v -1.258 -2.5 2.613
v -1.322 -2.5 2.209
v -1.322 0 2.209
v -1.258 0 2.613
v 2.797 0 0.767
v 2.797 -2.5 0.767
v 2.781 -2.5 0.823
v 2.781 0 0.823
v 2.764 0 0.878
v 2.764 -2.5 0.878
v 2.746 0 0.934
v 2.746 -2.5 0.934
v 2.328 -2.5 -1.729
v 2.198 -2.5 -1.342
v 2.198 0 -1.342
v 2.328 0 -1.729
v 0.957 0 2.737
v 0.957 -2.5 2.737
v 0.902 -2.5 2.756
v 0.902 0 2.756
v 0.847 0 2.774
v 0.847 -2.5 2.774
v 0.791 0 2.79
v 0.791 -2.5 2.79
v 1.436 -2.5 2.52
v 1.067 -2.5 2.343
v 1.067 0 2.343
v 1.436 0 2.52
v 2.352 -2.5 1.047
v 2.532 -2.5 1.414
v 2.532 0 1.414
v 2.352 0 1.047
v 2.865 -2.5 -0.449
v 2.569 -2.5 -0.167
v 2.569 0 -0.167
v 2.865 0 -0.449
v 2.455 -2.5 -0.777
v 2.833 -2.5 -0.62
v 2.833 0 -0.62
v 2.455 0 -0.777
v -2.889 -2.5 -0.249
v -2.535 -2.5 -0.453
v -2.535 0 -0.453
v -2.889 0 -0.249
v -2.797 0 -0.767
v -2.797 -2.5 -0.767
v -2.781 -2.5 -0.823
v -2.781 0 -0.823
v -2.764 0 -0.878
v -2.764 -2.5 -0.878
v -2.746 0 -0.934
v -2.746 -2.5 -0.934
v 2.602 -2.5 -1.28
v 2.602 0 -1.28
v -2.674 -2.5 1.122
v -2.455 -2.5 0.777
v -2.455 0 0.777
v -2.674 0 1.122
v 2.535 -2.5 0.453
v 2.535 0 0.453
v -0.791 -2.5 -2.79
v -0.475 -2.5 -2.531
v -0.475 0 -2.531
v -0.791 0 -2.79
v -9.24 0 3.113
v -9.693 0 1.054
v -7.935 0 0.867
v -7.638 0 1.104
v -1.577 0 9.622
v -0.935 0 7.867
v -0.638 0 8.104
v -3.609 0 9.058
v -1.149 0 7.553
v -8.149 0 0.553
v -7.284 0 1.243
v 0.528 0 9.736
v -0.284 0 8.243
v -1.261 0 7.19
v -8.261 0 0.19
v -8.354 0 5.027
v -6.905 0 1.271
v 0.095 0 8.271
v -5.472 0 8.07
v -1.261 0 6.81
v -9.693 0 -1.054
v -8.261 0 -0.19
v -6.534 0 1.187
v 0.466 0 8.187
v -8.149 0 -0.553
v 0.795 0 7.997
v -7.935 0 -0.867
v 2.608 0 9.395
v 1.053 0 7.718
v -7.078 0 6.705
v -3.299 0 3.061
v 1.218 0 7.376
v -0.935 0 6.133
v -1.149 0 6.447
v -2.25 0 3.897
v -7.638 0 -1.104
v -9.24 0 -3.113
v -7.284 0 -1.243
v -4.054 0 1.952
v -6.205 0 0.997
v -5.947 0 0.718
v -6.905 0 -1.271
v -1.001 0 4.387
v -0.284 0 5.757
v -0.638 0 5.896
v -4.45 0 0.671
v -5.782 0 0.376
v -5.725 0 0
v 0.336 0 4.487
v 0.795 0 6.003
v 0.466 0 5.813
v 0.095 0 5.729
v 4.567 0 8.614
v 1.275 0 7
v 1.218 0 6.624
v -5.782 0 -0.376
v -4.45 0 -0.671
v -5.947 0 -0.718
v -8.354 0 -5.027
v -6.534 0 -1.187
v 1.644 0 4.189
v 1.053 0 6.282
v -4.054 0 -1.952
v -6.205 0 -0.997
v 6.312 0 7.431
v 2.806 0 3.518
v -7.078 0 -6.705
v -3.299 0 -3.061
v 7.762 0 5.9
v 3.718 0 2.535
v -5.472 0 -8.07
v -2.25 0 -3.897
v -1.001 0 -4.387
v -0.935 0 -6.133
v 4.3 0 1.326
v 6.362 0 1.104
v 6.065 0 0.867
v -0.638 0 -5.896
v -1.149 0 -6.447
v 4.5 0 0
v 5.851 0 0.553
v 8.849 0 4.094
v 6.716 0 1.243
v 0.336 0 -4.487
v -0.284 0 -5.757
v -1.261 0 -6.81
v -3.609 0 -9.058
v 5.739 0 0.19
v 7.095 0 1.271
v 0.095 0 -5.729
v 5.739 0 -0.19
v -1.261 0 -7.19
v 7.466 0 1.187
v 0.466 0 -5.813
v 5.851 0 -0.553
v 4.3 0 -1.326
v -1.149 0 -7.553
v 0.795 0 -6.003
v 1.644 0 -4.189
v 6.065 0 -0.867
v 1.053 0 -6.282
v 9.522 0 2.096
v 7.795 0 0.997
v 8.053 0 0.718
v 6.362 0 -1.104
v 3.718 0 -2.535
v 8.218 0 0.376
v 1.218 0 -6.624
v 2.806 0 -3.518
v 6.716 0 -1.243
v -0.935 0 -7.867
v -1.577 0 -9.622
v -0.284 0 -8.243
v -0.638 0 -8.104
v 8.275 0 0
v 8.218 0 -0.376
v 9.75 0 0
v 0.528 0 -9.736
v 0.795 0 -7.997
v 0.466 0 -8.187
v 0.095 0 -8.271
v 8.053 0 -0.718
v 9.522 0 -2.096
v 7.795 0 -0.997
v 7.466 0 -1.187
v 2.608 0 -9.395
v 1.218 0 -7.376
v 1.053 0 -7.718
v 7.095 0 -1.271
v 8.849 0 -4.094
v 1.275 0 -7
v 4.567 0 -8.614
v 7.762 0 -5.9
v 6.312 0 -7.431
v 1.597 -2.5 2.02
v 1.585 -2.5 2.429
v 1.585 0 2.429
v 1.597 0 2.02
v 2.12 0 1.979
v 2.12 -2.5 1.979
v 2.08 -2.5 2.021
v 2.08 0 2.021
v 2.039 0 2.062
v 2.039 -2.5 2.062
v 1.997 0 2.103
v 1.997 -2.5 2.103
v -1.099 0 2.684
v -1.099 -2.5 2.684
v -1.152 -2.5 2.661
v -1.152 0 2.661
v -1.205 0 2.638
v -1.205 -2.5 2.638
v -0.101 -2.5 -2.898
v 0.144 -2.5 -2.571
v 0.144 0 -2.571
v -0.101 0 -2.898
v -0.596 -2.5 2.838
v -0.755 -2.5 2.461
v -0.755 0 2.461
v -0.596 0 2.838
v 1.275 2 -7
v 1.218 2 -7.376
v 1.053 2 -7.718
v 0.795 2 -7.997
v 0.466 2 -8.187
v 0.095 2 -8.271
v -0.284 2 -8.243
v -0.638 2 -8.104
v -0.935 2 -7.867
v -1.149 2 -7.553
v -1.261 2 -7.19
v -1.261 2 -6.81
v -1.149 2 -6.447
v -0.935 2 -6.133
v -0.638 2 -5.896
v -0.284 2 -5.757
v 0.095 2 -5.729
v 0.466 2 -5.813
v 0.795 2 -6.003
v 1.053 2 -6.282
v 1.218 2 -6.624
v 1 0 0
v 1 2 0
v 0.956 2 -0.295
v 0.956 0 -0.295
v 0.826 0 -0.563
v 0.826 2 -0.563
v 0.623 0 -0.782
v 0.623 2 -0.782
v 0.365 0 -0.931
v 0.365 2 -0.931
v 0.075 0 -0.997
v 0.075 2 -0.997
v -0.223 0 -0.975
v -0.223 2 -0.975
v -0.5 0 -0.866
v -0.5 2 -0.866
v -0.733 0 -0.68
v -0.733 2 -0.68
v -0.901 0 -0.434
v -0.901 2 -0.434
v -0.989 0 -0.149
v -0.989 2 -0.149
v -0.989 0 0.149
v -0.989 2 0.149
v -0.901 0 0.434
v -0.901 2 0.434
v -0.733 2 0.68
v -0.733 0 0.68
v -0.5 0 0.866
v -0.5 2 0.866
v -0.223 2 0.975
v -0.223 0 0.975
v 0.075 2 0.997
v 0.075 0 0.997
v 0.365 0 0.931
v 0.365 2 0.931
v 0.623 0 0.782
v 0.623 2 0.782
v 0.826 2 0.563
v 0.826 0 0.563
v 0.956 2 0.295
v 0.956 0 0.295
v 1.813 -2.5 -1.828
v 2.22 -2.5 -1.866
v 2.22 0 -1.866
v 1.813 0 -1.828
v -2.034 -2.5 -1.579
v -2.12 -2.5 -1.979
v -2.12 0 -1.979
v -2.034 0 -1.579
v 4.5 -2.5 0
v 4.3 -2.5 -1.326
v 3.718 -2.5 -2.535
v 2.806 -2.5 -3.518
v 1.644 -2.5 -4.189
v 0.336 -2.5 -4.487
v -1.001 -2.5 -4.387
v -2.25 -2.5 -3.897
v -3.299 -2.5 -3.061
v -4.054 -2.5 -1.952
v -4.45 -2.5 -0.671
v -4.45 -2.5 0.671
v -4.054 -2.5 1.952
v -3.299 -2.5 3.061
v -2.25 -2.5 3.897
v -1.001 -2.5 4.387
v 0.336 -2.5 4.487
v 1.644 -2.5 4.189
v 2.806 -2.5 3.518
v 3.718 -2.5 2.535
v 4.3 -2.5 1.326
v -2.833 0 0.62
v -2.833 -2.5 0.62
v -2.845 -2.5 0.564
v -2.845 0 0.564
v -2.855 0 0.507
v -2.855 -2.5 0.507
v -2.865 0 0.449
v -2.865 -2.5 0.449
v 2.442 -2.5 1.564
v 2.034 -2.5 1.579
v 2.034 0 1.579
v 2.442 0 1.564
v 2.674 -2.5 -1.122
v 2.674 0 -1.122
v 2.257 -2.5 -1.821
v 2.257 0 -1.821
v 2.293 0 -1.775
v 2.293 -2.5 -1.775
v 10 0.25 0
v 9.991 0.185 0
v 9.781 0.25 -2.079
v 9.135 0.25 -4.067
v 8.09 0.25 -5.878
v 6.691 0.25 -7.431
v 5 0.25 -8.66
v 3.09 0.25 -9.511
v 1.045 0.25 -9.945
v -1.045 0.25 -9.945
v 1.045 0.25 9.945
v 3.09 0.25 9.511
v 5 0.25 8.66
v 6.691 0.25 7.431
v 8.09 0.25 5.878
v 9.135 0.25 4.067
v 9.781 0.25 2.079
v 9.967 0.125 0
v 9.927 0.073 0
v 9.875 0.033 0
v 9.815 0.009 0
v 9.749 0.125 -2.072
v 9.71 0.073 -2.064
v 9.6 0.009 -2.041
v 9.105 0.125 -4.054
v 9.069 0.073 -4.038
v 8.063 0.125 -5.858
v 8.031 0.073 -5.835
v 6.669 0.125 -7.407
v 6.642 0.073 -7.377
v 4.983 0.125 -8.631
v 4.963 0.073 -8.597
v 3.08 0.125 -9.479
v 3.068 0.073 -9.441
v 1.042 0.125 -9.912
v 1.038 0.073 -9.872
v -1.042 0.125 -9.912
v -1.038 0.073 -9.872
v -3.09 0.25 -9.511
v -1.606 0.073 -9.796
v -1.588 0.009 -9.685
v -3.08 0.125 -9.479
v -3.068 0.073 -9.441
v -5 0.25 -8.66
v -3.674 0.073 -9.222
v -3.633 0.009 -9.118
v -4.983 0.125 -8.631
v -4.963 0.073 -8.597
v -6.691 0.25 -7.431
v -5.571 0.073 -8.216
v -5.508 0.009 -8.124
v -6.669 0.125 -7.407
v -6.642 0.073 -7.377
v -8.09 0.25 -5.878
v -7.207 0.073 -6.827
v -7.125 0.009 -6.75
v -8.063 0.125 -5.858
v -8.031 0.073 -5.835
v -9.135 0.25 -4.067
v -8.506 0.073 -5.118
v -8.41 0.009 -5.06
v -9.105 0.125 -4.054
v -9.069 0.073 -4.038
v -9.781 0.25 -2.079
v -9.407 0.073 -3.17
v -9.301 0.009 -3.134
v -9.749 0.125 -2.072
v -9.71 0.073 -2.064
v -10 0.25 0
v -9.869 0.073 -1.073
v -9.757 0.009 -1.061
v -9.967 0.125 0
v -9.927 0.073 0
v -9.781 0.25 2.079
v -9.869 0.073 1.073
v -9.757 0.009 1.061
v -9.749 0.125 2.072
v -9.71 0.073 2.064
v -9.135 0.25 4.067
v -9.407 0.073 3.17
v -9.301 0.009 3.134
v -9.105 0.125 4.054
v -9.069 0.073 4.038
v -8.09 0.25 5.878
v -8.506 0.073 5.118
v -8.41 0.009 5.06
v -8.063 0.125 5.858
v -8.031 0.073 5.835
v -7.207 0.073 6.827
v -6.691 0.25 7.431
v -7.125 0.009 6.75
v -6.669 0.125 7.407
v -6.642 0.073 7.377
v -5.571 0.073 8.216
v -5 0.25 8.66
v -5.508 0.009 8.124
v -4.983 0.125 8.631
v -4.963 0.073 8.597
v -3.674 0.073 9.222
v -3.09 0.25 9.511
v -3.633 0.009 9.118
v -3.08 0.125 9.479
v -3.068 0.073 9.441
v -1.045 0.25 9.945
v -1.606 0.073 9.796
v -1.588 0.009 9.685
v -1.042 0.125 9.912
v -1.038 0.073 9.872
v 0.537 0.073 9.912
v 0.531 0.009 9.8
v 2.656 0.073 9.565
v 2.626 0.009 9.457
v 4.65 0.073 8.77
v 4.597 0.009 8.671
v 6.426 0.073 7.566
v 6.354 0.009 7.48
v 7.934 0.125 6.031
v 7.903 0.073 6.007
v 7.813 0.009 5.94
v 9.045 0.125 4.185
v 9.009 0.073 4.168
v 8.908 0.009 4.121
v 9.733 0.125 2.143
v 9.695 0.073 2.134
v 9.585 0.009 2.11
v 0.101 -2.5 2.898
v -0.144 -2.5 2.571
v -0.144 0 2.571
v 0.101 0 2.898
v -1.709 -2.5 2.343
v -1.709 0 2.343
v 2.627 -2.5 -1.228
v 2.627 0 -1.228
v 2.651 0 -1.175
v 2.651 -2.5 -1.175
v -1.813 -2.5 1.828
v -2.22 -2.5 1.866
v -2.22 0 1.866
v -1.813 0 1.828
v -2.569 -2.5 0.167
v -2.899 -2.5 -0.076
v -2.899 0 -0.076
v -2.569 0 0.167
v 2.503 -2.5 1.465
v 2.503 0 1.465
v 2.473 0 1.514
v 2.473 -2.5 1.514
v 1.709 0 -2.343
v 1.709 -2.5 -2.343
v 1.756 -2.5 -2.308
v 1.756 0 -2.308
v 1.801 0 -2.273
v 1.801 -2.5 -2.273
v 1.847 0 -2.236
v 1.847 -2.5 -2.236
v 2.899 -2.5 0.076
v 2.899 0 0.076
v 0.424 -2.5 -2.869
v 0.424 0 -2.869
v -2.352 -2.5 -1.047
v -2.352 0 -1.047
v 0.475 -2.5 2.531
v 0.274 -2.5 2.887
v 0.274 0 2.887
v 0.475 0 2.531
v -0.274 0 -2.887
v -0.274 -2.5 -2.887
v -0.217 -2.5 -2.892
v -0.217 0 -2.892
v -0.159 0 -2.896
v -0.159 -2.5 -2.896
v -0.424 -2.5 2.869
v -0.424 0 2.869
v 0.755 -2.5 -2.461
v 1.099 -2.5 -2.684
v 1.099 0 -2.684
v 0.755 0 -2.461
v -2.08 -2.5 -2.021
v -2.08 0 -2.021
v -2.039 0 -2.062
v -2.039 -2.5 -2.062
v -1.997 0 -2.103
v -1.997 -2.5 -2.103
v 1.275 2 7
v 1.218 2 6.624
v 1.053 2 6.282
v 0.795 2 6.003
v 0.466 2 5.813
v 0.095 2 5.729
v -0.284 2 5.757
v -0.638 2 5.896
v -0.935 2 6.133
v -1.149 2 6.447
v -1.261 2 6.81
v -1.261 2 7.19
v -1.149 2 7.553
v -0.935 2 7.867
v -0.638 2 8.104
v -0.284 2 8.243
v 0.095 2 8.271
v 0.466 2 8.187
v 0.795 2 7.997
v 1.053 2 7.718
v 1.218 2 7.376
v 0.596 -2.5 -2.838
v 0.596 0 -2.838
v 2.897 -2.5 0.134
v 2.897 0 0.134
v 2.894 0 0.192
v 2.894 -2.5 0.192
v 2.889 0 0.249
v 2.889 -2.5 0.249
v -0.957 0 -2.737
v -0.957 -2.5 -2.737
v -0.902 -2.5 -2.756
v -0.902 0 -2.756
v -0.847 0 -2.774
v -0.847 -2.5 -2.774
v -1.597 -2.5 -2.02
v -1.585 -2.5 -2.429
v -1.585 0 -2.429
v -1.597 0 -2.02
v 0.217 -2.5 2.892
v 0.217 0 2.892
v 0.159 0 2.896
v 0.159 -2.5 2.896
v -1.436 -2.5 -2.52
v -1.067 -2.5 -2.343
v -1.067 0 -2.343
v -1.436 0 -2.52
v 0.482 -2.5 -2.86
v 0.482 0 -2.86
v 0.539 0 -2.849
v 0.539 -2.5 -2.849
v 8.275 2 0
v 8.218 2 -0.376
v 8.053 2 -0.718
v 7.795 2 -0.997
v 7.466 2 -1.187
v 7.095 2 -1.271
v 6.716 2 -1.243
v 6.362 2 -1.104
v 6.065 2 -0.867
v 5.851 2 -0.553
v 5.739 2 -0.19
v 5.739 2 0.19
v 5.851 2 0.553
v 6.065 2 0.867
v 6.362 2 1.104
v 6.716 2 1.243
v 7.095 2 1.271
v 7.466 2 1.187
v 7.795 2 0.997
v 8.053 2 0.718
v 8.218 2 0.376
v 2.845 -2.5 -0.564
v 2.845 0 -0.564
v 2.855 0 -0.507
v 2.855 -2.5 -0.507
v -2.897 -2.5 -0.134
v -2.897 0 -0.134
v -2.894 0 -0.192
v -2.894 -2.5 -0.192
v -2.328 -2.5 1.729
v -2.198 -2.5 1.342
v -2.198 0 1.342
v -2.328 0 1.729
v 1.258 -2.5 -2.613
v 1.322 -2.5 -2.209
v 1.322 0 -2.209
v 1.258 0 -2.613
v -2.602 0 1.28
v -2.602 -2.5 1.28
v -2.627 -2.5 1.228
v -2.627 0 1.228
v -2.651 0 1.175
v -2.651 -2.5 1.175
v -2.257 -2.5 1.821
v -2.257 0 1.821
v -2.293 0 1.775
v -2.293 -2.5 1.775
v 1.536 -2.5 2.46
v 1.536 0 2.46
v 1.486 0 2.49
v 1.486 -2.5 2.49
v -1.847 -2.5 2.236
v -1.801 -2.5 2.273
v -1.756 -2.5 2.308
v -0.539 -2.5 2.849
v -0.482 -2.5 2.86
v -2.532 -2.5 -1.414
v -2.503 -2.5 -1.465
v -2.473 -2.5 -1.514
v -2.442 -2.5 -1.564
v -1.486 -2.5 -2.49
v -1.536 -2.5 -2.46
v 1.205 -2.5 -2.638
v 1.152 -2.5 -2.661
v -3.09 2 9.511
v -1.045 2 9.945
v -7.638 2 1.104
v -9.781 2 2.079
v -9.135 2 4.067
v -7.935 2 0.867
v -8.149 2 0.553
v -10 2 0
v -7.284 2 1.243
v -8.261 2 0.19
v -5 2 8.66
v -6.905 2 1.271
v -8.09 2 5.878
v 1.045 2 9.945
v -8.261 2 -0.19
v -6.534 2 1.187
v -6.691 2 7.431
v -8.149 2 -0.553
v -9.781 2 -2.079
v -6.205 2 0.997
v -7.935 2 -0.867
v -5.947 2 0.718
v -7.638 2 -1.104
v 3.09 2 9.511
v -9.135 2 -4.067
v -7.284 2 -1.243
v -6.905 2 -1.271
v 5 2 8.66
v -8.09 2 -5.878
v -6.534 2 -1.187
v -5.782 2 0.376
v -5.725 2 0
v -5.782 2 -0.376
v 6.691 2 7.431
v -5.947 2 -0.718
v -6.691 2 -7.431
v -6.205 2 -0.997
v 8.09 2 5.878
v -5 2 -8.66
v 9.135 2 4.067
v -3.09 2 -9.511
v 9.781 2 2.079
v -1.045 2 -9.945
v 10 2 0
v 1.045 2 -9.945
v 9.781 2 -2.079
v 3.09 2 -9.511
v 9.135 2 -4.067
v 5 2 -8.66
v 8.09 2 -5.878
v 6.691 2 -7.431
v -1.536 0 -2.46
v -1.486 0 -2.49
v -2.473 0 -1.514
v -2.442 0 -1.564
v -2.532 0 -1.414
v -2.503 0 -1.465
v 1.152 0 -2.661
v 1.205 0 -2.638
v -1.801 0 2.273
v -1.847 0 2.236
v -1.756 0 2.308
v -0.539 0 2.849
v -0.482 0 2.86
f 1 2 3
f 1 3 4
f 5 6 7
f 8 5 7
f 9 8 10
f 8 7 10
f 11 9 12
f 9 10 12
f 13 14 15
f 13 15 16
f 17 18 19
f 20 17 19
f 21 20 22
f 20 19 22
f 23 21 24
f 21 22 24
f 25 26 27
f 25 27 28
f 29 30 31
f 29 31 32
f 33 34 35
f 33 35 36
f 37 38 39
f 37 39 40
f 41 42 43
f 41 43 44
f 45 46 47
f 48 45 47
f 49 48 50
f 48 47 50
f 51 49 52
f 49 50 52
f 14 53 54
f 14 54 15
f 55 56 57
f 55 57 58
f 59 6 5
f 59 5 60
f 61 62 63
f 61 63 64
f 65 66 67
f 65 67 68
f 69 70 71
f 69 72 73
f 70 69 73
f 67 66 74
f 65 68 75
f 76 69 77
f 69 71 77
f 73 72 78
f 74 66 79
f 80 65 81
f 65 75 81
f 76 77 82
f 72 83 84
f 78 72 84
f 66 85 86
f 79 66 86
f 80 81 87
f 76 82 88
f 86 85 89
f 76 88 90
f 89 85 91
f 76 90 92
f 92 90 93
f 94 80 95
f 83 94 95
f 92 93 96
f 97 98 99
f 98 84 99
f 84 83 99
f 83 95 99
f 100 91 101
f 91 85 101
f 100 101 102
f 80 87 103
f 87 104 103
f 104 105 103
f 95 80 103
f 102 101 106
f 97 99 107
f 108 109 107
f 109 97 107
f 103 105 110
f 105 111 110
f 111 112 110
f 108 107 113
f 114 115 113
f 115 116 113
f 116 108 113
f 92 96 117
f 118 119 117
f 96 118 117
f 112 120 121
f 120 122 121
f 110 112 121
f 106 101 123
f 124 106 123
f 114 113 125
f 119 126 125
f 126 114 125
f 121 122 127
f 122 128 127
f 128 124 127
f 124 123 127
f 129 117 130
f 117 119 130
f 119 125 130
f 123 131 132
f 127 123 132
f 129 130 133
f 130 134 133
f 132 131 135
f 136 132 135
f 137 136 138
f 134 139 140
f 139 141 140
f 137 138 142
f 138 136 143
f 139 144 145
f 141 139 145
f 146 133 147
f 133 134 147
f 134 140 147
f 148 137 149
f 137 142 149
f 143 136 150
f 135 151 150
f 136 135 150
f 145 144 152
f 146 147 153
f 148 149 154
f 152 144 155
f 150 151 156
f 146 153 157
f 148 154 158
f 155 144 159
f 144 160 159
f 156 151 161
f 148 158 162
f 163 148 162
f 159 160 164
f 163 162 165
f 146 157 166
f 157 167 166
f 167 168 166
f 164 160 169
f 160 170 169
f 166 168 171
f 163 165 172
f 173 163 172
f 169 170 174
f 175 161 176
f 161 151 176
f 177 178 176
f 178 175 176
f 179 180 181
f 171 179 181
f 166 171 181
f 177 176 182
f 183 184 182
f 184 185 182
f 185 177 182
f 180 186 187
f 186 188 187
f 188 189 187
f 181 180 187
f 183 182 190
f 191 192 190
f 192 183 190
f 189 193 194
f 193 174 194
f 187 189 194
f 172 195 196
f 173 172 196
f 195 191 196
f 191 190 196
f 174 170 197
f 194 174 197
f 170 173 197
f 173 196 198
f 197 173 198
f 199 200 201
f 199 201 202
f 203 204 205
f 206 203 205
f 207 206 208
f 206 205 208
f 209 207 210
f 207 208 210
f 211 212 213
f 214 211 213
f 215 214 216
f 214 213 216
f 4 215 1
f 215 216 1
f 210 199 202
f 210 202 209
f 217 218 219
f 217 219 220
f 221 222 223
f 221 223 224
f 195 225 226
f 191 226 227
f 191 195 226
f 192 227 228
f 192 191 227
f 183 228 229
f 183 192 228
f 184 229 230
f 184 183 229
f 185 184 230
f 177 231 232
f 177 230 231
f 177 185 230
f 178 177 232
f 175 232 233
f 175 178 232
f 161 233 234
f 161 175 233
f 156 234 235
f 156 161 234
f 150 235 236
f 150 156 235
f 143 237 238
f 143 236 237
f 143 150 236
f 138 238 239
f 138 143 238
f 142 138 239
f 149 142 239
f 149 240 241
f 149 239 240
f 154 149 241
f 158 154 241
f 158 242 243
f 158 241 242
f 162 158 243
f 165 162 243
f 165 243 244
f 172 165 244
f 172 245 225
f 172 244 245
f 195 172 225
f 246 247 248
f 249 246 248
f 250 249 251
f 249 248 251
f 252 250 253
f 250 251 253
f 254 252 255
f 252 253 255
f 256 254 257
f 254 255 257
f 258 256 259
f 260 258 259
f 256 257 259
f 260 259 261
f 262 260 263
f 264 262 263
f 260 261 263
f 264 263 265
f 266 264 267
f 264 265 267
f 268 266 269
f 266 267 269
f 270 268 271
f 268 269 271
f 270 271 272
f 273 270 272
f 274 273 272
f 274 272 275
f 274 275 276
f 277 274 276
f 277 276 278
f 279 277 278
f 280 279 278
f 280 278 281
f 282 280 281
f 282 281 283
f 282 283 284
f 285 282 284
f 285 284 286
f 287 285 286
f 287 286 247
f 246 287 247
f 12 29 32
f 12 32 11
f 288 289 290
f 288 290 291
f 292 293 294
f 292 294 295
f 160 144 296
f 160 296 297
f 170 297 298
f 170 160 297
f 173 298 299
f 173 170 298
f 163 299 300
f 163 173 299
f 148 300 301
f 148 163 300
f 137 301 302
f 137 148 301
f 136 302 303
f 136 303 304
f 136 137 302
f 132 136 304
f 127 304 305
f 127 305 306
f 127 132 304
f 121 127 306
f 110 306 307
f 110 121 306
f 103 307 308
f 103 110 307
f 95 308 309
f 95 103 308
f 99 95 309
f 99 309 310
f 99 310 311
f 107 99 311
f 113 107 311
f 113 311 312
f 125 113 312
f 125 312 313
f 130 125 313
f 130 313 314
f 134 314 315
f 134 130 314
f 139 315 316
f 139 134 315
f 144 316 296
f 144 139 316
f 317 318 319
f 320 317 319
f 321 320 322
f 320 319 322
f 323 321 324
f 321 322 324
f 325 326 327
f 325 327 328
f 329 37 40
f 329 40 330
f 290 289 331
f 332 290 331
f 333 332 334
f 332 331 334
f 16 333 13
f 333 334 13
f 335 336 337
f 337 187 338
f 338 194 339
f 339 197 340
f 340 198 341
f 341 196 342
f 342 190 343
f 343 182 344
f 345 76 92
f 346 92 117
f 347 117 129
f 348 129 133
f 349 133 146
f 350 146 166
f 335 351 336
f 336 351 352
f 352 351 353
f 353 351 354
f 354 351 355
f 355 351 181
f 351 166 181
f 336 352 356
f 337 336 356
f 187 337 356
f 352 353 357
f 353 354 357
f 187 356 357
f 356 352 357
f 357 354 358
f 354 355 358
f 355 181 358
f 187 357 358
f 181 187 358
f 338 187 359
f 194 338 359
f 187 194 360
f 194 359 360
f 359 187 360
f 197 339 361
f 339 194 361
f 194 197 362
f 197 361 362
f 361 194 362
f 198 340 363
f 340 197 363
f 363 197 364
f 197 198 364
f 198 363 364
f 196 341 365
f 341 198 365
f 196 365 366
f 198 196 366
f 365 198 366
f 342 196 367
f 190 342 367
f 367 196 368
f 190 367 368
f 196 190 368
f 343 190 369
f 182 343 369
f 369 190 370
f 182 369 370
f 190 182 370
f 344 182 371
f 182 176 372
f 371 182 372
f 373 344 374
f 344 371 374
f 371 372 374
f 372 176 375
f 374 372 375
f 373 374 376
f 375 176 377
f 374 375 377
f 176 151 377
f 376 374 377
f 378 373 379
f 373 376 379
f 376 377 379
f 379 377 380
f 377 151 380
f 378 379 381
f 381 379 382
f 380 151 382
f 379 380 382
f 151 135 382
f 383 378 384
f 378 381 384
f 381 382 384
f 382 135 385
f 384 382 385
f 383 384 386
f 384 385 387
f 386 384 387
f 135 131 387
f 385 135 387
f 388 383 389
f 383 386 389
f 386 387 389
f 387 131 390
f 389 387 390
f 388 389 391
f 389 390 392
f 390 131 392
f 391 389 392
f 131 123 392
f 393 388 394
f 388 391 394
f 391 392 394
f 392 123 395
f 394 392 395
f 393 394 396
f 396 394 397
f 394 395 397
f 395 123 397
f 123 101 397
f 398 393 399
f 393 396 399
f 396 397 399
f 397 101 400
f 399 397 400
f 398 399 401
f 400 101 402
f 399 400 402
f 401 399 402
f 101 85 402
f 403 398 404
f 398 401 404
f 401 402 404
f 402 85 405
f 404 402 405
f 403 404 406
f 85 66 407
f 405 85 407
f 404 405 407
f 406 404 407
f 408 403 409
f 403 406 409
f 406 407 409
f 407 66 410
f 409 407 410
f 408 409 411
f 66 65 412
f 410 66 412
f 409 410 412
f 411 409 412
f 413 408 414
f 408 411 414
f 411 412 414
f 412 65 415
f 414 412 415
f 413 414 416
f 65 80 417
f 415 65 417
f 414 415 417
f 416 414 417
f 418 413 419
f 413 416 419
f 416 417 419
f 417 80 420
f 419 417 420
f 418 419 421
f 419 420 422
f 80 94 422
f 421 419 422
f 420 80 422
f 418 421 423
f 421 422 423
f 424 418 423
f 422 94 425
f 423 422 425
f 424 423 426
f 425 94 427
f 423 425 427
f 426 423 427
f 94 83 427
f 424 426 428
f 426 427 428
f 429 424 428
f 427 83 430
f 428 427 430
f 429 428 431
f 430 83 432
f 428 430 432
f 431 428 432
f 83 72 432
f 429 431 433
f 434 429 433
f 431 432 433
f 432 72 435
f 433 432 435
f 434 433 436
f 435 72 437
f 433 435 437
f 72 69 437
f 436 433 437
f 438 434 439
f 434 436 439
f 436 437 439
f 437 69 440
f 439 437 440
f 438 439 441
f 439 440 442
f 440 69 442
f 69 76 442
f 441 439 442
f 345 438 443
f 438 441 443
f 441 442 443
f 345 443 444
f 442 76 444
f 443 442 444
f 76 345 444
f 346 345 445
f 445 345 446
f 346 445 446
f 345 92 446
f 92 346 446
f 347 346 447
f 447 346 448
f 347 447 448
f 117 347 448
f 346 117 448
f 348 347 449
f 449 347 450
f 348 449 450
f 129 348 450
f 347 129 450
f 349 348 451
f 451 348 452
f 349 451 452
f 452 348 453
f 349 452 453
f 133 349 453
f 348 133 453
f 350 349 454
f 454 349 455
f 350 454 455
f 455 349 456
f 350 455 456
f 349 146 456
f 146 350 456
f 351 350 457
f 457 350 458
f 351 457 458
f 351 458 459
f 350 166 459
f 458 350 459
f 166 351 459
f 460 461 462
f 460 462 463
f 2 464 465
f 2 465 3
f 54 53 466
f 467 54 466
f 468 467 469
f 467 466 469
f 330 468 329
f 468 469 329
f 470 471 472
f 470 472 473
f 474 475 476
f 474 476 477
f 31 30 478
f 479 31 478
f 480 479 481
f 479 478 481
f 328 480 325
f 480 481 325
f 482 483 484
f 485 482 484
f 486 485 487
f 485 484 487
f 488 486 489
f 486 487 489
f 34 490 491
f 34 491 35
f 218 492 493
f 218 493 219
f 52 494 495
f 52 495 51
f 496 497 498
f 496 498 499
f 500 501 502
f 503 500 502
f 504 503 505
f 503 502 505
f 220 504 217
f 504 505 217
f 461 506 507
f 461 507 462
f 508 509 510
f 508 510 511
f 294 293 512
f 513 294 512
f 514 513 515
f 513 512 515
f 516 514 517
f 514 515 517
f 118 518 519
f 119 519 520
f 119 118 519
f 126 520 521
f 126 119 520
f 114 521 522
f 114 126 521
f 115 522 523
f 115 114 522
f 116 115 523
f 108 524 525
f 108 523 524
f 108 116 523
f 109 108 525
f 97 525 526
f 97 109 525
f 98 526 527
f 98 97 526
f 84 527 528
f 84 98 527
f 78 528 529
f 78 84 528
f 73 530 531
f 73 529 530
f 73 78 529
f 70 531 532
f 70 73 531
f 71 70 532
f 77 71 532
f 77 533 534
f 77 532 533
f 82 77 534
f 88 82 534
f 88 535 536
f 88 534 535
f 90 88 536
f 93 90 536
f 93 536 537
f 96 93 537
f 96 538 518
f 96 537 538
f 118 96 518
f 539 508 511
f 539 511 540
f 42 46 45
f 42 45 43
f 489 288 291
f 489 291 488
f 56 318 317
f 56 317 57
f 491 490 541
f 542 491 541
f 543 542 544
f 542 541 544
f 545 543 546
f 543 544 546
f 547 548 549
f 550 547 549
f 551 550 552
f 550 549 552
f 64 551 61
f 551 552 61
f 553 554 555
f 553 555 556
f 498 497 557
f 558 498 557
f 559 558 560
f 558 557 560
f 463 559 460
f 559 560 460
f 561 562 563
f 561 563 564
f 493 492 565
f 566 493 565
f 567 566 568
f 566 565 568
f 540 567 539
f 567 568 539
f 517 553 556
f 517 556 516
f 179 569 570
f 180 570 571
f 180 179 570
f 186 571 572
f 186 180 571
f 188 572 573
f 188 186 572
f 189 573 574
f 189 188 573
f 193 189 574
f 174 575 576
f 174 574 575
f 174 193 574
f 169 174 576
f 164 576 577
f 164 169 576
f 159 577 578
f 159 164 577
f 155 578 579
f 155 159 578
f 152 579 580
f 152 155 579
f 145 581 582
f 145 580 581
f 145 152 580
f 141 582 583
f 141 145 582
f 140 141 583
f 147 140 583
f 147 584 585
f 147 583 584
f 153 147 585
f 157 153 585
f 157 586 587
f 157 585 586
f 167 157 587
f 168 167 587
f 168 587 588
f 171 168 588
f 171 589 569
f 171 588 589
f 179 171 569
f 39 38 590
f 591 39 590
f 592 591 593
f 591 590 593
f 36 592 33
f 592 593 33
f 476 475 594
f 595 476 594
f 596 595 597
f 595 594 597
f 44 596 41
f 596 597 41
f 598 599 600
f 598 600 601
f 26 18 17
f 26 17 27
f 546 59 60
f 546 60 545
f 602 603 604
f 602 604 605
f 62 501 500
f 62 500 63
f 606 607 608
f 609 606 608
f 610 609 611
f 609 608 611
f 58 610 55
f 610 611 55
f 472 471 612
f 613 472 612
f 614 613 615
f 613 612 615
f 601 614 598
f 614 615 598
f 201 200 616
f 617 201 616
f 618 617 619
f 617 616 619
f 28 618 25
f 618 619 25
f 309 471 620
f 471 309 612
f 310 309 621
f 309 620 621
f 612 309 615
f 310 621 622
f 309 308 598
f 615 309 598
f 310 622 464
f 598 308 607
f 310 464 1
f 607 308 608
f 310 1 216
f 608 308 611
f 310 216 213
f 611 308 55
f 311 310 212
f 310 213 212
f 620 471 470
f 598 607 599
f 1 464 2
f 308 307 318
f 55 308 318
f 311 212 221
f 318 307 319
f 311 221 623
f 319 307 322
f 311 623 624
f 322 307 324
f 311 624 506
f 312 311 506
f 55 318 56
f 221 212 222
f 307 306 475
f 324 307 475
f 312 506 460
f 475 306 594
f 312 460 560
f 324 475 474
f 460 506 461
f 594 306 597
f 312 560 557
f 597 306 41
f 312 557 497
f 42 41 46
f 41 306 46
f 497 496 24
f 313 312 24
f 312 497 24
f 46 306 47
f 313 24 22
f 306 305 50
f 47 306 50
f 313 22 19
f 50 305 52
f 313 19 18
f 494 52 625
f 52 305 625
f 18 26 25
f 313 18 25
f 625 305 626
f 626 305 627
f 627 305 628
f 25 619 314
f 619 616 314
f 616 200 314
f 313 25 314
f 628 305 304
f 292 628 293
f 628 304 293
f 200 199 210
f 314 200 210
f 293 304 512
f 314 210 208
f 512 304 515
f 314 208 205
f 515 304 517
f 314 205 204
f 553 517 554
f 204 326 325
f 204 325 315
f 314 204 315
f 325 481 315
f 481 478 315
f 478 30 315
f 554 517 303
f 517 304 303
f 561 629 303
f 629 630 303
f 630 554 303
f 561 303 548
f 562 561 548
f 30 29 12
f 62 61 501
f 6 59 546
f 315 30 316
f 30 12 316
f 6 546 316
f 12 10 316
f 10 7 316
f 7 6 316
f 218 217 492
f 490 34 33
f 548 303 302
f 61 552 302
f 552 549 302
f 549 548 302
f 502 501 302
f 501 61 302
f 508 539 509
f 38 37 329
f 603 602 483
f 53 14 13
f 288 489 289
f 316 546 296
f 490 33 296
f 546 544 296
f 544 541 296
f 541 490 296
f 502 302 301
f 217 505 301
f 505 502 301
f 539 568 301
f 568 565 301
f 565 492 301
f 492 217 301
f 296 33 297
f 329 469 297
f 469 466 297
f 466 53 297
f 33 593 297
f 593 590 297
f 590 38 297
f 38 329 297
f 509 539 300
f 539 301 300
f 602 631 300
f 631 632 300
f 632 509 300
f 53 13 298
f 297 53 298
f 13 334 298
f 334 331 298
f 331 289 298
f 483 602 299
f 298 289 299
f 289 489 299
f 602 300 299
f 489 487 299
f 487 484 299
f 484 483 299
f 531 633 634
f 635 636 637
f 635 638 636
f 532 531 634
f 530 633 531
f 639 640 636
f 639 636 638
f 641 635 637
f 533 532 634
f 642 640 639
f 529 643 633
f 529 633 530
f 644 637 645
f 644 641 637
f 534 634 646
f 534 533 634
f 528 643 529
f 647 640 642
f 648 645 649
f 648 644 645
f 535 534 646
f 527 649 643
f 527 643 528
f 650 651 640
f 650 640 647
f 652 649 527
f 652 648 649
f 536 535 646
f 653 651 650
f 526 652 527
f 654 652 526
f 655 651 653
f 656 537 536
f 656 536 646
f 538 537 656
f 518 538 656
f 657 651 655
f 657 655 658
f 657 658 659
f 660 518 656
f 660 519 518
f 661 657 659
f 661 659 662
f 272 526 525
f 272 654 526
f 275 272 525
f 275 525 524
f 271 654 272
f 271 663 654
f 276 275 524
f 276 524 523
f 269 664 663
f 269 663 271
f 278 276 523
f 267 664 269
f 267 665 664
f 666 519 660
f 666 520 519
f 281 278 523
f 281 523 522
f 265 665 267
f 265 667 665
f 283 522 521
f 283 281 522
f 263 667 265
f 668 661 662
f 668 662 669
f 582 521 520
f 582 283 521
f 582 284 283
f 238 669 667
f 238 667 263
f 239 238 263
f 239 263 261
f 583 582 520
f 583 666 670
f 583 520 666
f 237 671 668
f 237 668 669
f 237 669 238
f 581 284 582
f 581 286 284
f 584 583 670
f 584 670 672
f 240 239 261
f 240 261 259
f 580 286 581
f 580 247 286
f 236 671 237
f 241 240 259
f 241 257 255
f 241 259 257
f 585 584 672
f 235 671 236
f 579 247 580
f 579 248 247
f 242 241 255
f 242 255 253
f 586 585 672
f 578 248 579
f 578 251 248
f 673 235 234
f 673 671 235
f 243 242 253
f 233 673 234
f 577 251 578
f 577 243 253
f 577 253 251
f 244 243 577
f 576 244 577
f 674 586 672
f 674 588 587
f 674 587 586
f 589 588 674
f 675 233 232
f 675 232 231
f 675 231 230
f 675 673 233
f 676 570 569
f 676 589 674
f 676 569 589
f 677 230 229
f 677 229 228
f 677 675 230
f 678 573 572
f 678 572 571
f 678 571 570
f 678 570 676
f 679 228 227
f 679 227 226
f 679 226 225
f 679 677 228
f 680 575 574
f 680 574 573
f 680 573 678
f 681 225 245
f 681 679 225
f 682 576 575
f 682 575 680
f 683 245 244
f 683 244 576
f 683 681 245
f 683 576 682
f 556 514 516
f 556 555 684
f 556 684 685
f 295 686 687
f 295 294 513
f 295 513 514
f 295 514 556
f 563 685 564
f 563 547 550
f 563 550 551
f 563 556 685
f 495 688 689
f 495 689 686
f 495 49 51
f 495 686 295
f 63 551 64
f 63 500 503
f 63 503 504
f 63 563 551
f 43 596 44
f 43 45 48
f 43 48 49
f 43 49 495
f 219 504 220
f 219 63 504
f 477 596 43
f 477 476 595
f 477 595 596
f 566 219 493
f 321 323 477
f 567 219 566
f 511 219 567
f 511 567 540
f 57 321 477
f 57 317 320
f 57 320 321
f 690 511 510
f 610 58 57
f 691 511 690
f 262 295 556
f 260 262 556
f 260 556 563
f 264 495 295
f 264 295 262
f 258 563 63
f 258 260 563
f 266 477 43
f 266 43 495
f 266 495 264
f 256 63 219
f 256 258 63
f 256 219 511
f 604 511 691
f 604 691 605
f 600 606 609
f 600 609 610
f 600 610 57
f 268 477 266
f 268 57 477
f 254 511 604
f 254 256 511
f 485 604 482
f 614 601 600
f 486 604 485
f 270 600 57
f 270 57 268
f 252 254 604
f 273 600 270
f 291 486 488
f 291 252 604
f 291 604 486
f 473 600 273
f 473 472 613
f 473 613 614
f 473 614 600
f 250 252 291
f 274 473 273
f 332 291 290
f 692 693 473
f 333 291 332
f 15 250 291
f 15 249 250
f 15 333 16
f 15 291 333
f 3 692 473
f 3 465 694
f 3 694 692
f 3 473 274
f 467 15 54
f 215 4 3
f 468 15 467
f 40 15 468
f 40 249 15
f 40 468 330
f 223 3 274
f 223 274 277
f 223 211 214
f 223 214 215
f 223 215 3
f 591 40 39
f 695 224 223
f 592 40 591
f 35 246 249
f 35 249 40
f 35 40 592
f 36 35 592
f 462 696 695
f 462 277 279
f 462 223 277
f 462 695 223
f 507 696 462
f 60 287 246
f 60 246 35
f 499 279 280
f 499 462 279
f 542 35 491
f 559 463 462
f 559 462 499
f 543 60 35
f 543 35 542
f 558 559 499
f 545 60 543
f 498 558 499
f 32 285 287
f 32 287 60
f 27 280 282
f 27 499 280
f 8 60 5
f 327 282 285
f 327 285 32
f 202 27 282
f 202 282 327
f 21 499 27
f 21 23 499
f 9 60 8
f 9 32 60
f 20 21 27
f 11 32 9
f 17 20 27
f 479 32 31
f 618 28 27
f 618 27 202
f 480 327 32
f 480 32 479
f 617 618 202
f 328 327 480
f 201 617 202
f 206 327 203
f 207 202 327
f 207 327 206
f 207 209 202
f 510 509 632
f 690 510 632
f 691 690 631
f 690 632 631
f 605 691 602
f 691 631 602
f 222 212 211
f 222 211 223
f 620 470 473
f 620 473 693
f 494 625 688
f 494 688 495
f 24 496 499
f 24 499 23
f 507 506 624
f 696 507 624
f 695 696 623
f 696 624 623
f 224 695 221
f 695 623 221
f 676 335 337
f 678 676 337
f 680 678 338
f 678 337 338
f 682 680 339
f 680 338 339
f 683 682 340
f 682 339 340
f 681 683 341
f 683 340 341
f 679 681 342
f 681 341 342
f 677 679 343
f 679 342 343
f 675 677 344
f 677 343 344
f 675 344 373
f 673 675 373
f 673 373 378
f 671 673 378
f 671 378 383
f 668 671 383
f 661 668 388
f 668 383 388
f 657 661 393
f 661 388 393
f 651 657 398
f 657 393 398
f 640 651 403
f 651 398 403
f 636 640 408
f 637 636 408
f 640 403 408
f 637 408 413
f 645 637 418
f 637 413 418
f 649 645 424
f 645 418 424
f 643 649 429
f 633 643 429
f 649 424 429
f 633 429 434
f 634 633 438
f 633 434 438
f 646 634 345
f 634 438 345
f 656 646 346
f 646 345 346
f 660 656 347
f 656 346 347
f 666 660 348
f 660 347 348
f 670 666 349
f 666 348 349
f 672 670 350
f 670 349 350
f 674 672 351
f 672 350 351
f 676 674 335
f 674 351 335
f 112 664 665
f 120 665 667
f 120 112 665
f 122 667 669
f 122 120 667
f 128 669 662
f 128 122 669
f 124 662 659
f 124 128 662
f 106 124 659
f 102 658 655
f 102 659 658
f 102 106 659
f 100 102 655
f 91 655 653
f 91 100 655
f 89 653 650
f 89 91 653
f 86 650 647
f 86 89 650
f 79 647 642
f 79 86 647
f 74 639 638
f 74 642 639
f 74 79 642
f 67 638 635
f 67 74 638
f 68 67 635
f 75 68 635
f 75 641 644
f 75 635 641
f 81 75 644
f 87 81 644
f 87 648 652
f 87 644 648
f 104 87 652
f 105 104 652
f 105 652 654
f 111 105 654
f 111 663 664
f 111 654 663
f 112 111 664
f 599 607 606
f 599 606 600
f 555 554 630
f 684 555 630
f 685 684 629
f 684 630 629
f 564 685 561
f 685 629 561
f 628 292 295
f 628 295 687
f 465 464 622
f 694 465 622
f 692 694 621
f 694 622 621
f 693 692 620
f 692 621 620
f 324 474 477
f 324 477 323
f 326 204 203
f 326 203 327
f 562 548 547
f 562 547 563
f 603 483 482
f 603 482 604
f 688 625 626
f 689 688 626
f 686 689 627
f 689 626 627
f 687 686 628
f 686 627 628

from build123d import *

# Parameters (mm, degrees)
SKETCH1_R           = 10
BOSS_EXTRUDE1_DEPTH = 2
SKETCH2_R           = 4.5
BOSS_EXTRUDE2_DEPTH = 2.5
SKETCH3_R           = 1.275
CUT_EXTRUDE1_DEPTH  = 3
FILLET1_R           = 0.25
SKETCH6_R           = 1
CUT_EXTRUDE2_DEPTH  = 5.5
SKETCH7_R           = 2.9
CUT_EXTRUDE3_DEPTH  = 2.5
BOSS_EXTRUDE4_DEPTH = 2.5
CIRPATTERN1_COUNT   = 26


with BuildPart() as part:
    # Sketch1 → Boss-Extrude1 (new body)
    with BuildSketch(Plane(origin=(0, 0, 0), x_dir=(1, 0, 0), z_dir=(0, 1, 0))):
        Circle(SKETCH1_R)
    extrude(amount=BOSS_EXTRUDE1_DEPTH)

    # Sketch2 → Boss-Extrude2 (add)
    with BuildSketch(Plane(origin=(0, 0, 0), x_dir=(1, 0, 0), z_dir=(0, 1, 0))):
        Circle(SKETCH2_R)
    extrude(amount=-BOSS_EXTRUDE2_DEPTH)

    # Sketch3 → Cut-Extrude1 (cut, through all)
    with BuildSketch(Plane(origin=(0, 0, 0), x_dir=(1, 0, 0), z_dir=(0, 1, 0))):
        with Locations((0, 7)):
            Circle(SKETCH3_R)
        with Locations((-7, 0)):
            Circle(SKETCH3_R)
        with Locations((0, -7)):
            Circle(SKETCH3_R)
        with Locations((7, 0)):
            Circle(SKETCH3_R)
    extrude(amount=CUT_EXTRUDE1_DEPTH, mode=Mode.SUBTRACT)

    # Fillet1
    fillet1_edges = [part.edges().sort_by_distance(p)[0] for p in [
        (-10, 0, 0),
    ]]
    fillet(fillet1_edges, radius=FILLET1_R)

    # Sketch6 → Cut-Extrude2 (cut, through all)
    with BuildSketch(Plane(origin=(0, 2, 0), x_dir=(1, 0, 0), z_dir=(0, 1, 0))):
        Circle(SKETCH6_R)
    extrude(amount=-CUT_EXTRUDE2_DEPTH, mode=Mode.SUBTRACT)

    # Sketch7 → Cut-Extrude3 (cut)
    with BuildSketch(Plane.XZ.offset(2.5)):
        Circle(SKETCH7_R)
    extrude(amount=-CUT_EXTRUDE3_DEPTH, mode=Mode.SUBTRACT)

    # Sketch8 → Boss-Extrude4 (add)
    with BuildSketch(Plane.XZ.offset(2.5)):
        with BuildLine():
            Line((-2.35244742, -1.046531787), (-2.745588284, -0.933672842))
            ThreePointArc((-2.745588284, -0.933672842), (-2.649635472, -1.178741646), (-2.531859978, -1.414102207))
            Line((-2.531859978, -1.414102207), (-2.35244742, -1.046531787))
        make_face()
    boss_extrude4 = extrude(amount=-BOSS_EXTRUDE4_DEPTH)

    # CirPattern1: Boss-Extrude4 ×26 about axis
    cirpattern1_axis = Axis((0, 0, 0), (0, 1, 0))
    for i in range(1, CIRPATTERN1_COUNT):
        add(boss_extrude4.rotate(cirpattern1_axis, i * 360 / CIRPATTERN1_COUNT))


solid = part.part
